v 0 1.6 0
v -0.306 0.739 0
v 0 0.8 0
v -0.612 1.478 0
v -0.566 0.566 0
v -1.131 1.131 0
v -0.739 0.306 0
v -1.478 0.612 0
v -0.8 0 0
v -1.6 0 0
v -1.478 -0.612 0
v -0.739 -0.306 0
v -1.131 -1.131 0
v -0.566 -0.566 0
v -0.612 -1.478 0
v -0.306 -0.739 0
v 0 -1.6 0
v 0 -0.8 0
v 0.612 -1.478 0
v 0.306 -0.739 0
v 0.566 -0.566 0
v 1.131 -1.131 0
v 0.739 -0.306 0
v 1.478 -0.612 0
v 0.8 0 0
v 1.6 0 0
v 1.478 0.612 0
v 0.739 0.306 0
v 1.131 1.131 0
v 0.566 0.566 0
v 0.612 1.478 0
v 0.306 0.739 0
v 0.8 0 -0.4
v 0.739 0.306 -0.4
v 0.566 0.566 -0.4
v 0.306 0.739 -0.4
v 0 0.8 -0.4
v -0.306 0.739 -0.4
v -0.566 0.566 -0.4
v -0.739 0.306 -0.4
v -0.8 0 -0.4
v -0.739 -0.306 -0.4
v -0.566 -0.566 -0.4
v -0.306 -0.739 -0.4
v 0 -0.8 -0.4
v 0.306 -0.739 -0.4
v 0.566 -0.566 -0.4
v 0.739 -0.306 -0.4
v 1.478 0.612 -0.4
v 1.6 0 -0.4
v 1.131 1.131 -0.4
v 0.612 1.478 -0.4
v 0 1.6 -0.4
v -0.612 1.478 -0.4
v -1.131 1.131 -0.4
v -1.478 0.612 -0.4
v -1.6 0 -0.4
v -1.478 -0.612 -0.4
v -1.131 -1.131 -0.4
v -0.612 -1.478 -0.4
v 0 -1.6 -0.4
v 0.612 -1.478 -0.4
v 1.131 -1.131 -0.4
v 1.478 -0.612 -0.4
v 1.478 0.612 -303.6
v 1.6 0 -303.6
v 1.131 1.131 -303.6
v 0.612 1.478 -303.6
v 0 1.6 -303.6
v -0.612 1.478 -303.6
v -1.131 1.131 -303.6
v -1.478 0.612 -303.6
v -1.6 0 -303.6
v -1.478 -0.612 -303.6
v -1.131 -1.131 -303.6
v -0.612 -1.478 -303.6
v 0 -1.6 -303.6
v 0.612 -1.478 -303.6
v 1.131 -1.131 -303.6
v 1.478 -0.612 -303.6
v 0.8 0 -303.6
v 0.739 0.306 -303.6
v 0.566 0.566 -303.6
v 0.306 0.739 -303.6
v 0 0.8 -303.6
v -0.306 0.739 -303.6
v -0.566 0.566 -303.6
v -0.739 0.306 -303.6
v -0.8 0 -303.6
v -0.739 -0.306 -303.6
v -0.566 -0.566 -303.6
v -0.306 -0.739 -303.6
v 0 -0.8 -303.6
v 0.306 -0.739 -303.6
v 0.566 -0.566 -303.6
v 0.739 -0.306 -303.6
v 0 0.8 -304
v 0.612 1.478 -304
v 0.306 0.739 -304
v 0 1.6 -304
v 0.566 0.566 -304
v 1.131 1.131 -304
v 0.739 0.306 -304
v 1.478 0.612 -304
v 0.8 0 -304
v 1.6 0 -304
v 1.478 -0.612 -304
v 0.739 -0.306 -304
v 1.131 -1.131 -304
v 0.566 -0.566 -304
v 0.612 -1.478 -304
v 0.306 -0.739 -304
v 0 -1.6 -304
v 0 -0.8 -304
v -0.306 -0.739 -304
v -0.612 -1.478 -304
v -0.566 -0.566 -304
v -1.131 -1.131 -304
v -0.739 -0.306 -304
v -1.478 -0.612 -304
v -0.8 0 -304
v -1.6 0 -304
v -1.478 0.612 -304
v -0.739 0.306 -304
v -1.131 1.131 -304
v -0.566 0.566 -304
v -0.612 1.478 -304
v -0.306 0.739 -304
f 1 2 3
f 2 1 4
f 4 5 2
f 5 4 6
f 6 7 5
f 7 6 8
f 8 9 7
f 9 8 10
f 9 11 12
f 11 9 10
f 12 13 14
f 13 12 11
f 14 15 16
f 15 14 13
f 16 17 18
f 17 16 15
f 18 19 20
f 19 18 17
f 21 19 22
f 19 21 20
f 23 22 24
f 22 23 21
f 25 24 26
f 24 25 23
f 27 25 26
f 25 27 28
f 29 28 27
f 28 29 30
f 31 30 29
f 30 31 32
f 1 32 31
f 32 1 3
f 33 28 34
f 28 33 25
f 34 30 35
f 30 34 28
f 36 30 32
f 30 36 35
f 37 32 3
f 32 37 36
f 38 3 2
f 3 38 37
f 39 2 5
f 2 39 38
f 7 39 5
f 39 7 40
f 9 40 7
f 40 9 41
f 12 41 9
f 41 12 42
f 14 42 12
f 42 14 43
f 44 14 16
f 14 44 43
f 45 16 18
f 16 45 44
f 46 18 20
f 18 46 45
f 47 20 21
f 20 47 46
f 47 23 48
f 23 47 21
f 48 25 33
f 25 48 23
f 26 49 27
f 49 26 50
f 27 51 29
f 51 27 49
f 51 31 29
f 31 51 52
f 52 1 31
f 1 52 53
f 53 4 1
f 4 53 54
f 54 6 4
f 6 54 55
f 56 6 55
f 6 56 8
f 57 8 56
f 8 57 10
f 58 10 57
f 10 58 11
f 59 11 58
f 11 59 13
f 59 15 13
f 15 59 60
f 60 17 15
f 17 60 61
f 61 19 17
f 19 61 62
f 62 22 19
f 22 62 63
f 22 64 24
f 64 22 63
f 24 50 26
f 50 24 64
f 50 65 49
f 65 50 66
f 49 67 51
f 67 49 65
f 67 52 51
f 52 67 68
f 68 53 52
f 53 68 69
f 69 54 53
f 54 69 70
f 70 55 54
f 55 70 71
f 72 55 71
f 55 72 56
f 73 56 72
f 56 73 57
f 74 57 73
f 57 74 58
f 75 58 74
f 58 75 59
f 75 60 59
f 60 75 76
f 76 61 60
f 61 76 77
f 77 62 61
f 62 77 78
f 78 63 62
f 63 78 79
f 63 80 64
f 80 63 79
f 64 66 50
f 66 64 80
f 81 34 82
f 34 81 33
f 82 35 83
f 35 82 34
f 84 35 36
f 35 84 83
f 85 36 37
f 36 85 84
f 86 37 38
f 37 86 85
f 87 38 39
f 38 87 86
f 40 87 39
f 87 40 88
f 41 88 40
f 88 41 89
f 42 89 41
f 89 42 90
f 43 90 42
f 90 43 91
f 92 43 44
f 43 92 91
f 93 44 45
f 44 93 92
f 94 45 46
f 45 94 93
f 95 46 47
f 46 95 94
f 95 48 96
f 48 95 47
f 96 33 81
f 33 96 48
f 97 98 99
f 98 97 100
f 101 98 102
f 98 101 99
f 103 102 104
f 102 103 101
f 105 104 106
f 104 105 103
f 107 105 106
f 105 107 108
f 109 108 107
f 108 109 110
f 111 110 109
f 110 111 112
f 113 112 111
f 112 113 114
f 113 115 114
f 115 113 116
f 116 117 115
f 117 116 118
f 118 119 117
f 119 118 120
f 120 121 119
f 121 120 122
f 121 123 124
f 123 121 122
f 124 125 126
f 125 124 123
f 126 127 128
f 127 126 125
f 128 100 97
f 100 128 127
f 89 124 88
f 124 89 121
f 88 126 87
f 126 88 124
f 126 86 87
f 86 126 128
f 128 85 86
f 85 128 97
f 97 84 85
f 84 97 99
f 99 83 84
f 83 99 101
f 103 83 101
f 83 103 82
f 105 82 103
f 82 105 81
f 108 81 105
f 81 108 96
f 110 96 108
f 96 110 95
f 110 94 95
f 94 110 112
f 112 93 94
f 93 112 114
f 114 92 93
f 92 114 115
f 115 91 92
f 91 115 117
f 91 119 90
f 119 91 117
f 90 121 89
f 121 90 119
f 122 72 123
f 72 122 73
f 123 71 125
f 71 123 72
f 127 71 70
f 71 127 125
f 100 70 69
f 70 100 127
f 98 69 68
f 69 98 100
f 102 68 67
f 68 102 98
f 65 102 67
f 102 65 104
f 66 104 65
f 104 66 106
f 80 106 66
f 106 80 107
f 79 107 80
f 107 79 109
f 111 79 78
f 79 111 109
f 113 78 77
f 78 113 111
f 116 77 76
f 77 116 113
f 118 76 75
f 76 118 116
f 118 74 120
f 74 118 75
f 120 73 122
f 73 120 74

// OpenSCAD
// file: ../p/4-4ring1.scad
use <../lib.scad>
function ldraw_lib__4_4ring1() = [
// 0 Ring  1 x 1.0
// 0 Name: 4-4ring1.dat
// 0 Author: James Jessiman
// 0 !LDRAW_ORG Primitive UPDATE 2009-01
// 0 !LICENSE Licensed under CC BY 4.0 : see CAreadme.txt
// 
// 0 BFC CERTIFY CCW
  [0,"BFC","CERTIFY"],
  [0,"BFC","CCW"],
// 
// 0 !HISTORY 1998-12-15 [PTadmin] Official Update 1998-10
// 0 !HISTORY 2002-04-08 [BrickCaster] Modified for BFC compliance
// 0 !HISTORY 2002-04-25 [PTadmin] Official Update 2002-02
// 0 !HISTORY 2007-06-24 [PTadmin] Header formatted for Contributor Agreement
// 0 !HISTORY 2008-07-01 [PTadmin] Official Update 2008-01
// 0 !HISTORY 2008-08-26 [cwdee] Switch polygon winding and rename
// 0 !HISTORY 2009-05-02 [PTadmin] Official Update 2009-01
// 
// 
// 4 16 -0.7654 0 1.8478 -0.3827 0 0.9239 0 0 1 0 0 2
  [4,16,-0.7654,0,1.8478,-0.3827,0,0.9239,0,0,1,0,0,2],
// 4 16 -1.4142 0 1.4142 -0.7071 0 0.7071 -0.3827 0 0.9239 -0.7654 0 1.8478
  [4,16,-1.4142,0,1.4142,-0.7071,0,0.7071,-0.3827,0,0.9239,-0.7654,0,1.8478],
// 4 16 -1.8478 0 0.7654 -0.9239 0 0.3827 -0.7071 0 0.7071 -1.4142 0 1.41420
  [4,16,-1.8478,0,0.7654,-0.9239,0,0.3827,-0.7071,0,0.7071,-1.4142,0,1.41420],
// 4 16 -2 0 0 -1 0 0 -0.9239 0 0.3827 -1.8478 0 0.7654
  [4,16,-2,0,0,-1,0,0,-0.9239,0,0.3827,-1.8478,0,0.7654],
// 4 16 -1.8478 0 -0.7654 -0.9239 0 -0.3827 -1 0 0 -2 0 0
  [4,16,-1.8478,0,-0.7654,-0.9239,0,-0.3827,-1,0,0,-2,0,0],
// 4 16 -1.4142 0 -1.4142 -0.7071 0 -0.7071 -0.9239 0 -0.3827 -1.8478 0 -0.7654
  [4,16,-1.4142,0,-1.4142,-0.7071,0,-0.7071,-0.9239,0,-0.3827,-1.8478,0,-0.7654],
// 4 16 -0.7654 0 -1.8478 -0.3827 0 -0.9239 -0.7071 0 -0.7071 -1.4142 0 -1.4142
  [4,16,-0.7654,0,-1.8478,-0.3827,0,-0.9239,-0.7071,0,-0.7071,-1.4142,0,-1.4142],
// 4 16 0 0 -2 0 0 -1 -0.3827 0 -0.9239 -0.7654 0 -1.8478
  [4,16,0,0,-2,0,0,-1,-0.3827,0,-0.9239,-0.7654,0,-1.8478],
// 4 16 0.7654 0 -1.8478 0.3827 0 -0.9239 0 0 -1 0 0 -2
  [4,16,0.7654,0,-1.8478,0.3827,0,-0.9239,0,0,-1,0,0,-2],
// 4 16 1.4142 0 -1.4142 0.7071 0 -0.7071 0.3827 0 -0.9239 0.7654 0 -1.8478
  [4,16,1.4142,0,-1.4142,0.7071,0,-0.7071,0.3827,0,-0.9239,0.7654,0,-1.8478],
// 4 16 1.8478 0 -0.7654 0.9239 0 -0.3827 0.7071 0 -0.7071 1.4142 0 -1.4142
  [4,16,1.8478,0,-0.7654,0.9239,0,-0.3827,0.7071,0,-0.7071,1.4142,0,-1.4142],
// 4 16 2 0 0 1 0 0 0.9239 0 -0.3827 1.8478 0 -0.7654
  [4,16,2,0,0,1,0,0,0.9239,0,-0.3827,1.8478,0,-0.7654],
// 4 16 1.8478 0 0.7654 0.9239 0 0.3827 1 0 0 2 0 0
  [4,16,1.8478,0,0.7654,0.9239,0,0.3827,1,0,0,2,0,0],
// 4 16 1.4142 0 1.4142 0.7071 0 0.7071 0.9239 0 0.3827 1.8478 0 0.7654
  [4,16,1.4142,0,1.4142,0.7071,0,0.7071,0.9239,0,0.3827,1.8478,0,0.7654],
// 4 16 0.7654 0 1.8478 0.3827 0 0.9239 0.7071 0 0.7071 1.4142 0 1.4142
  [4,16,0.7654,0,1.8478,0.3827,0,0.9239,0.7071,0,0.7071,1.4142,0,1.4142],
// 4 16 0 0 2 0 0 1 0.3827 0 0.9239 0.7654 0 1.8478
  [4,16,0,0,2,0,0,1,0.3827,0,0.9239,0.7654,0,1.8478],
// 0
];
module ldraw_lib__4_4ring1(step=0, col=false, unit=2/5, alt=false, line=0.2, solid=!$preview)
    makepoly(ldraw_lib__4_4ring1(), step=step, col=col, unit=unit, alt=alt, line=line, solid=solid);
ldraw_lib__4_4ring1(line=0.2);
// file: ../p/4-4edge.scad
use <../lib.scad>
function ldraw_lib__4_4edge() = [
// 0 Circle 1.0
// 0 Name: 4-4edge.dat
// 0 Author: James Jessiman
// 0 !LDRAW_ORG Primitive UPDATE 2017-01
// 0 !LICENSE Licensed under CC BY 4.0 : see CAreadme.txt
// 
// 0 BFC CERTIFY CCW
  [0,"BFC","CERTIFY"],
  [0,"BFC","CCW"],
// 
// 0 !HISTORY 1998-12-15 [PTadmin] Official Update 1998-10
// 0 !HISTORY 2005-12-28 [PTadmin] Official Update 2005-01
// 0 !HISTORY 2007-06-24 [PTadmin] Header formatted for Contributor Agreement
// 0 !HISTORY 2008-07-01 [PTadmin] Official Update 2008-01
// 0 !HISTORY 2017-01-15 [Steffen] BFCed
// 0 !HISTORY 2017-12-30 [PTadmin] Official Update 2017-01
// 
// 
// 2 24 1 0 0 0.9239 0 0.3827
  [2,24,1,0,0,0.9239,0,0.3827],
// 2 24 0.9239 0 0.3827 0.7071 0 0.7071
  [2,24,0.9239,0,0.3827,0.7071,0,0.7071],
// 2 24 0.7071 0 0.7071 0.3827 0 0.9239
  [2,24,0.7071,0,0.7071,0.3827,0,0.9239],
// 2 24 0.3827 0 0.9239 0 0 1
  [2,24,0.3827,0,0.9239,0,0,1],
// 2 24 0 0 1 -0.3827 0 0.9239
  [2,24,0,0,1,-0.3827,0,0.9239],
// 2 24 -0.3827 0 0.9239 -0.7071 0 0.7071
  [2,24,-0.3827,0,0.9239,-0.7071,0,0.7071],
// 2 24 -0.7071 0 0.7071 -0.9239 0 0.3827
  [2,24,-0.7071,0,0.7071,-0.9239,0,0.3827],
// 2 24 -0.9239 0 0.3827 -1 0 -0
  [2,24,-0.9239,0,0.3827,-1,0,-0],
// 2 24 -1 0 -0 -0.9239 0 -0.3827
  [2,24,-1,0,-0,-0.9239,0,-0.3827],
// 2 24 -0.9239 0 -0.3827 -0.7071 0 -0.7071
  [2,24,-0.9239,0,-0.3827,-0.7071,0,-0.7071],
// 2 24 -0.7071 0 -0.7071 -0.3827 0 -0.9239
  [2,24,-0.7071,0,-0.7071,-0.3827,0,-0.9239],
// 2 24 -0.3827 0 -0.9239 0 0 -1
  [2,24,-0.3827,0,-0.9239,0,0,-1],
// 2 24 0 0 -1 0.3827 0 -0.9239
  [2,24,0,0,-1,0.3827,0,-0.9239],
// 2 24 0.3827 0 -0.9239 0.7071 0 -0.7071
  [2,24,0.3827,0,-0.9239,0.7071,0,-0.7071],
// 2 24 0.7071 0 -0.7071 0.9239 0 -0.3827
  [2,24,0.7071,0,-0.7071,0.9239,0,-0.3827],
// 2 24 0.9239 0 -0.3827 1 0 0
  [2,24,0.9239,0,-0.3827,1,0,0],
];
module ldraw_lib__4_4edge(step=0, col=false, unit=2/5, alt=false, line=0.2, solid=!$preview)
    makepoly(ldraw_lib__4_4edge(), step=step, col=col, unit=unit, alt=alt, line=line, solid=solid);
ldraw_lib__4_4edge(line=0.2);
// file: ../p/4-4cyli.scad
use <../lib.scad>
function ldraw_lib__4_4cyli() = [
// 0 Cylinder 1.0
// 0 Name: 4-4cyli.dat
// 0 Author: James Jessiman
// 0 !LDRAW_ORG Primitive UPDATE 2005-01
// 0 !LICENSE Licensed under CC BY 4.0 : see CAreadme.txt
// 
// 0 BFC CERTIFY CCW
  [0,"BFC","CERTIFY"],
  [0,"BFC","CCW"],
// 
// 0 !HISTORY 1998-12-15 [PTadmin] Official Update 1998-10
// 0 !HISTORY 2002-03-23 [sbliss] Added BFC statement; merged headers from files in distributions LDraw 0.27 and Complete.
// 0 !HISTORY 2002-04-25 [PTadmin] Official Update 2002-02
// 0 !HISTORY 2004-12-14 [guyvivan] BFC CCW
// 0 !HISTORY 2005-12-28 [PTadmin] Official Update 2005-01
// 0 !HISTORY 2007-06-24 [PTadmin] Header formatted for Contributor Agreement
// 0 !HISTORY 2008-07-01 [PTadmin] Official Update 2008-01
// 
// 
// 4 16 1 1 0 0.9239 1 0.3827 0.9239 0 0.3827 1 0 0
  [4,16,1,1,0,0.9239,1,0.3827,0.9239,0,0.3827,1,0,0],
// 5 24 1 0 0 1 1 0 0.9239 0 0.3827 0.9239 0 -0.3827
  [5,24,1,0,0,1,1,0,0.9239,0,0.3827,0.9239,0,-0.3827],
// 4 16 0.9239 1 0.3827 0.7071 1 0.7071 0.7071 0 0.7071 0.9239 0 0.3827
  [4,16,0.9239,1,0.3827,0.7071,1,0.7071,0.7071,0,0.7071,0.9239,0,0.3827],
// 5 24 0.9239 0 0.3827 0.9239 1 0.3827 0.7071 0 0.7071 1 0 0
  [5,24,0.9239,0,0.3827,0.9239,1,0.3827,0.7071,0,0.7071,1,0,0],
// 4 16 0.7071 1 0.7071 0.3827 1 0.9239 0.3827 0 0.9239 0.7071 0 0.7071
  [4,16,0.7071,1,0.7071,0.3827,1,0.9239,0.3827,0,0.9239,0.7071,0,0.7071],
// 5 24 0.7071 0 0.7071 0.7071 1 0.7071 0.3827 0 0.9239 0.9239 0 0.3827
  [5,24,0.7071,0,0.7071,0.7071,1,0.7071,0.3827,0,0.9239,0.9239,0,0.3827],
// 4 16 0.3827 1 0.9239 0 1 1 0 0 1 0.3827 0 0.9239
  [4,16,0.3827,1,0.9239,0,1,1,0,0,1,0.3827,0,0.9239],
// 5 24 0.3827 0 0.9239 0.3827 1 0.9239 0 0 1 0.7071 0 0.7071
  [5,24,0.3827,0,0.9239,0.3827,1,0.9239,0,0,1,0.7071,0,0.7071],
// 4 16 0 1 1 -0.3827 1 0.9239 -0.3827 0 0.9239 0 0 1
  [4,16,0,1,1,-0.3827,1,0.9239,-0.3827,0,0.9239,0,0,1],
// 5 24 0 0 1 0 1 1 -0.3827 0 0.9239 0.3827 0 0.9239
  [5,24,0,0,1,0,1,1,-0.3827,0,0.9239,0.3827,0,0.9239],
// 4 16 -0.3827 1 0.9239 -0.7071 1 0.7071 -0.7071 0 0.7071 -0.3827 0 0.9239
  [4,16,-0.3827,1,0.9239,-0.7071,1,0.7071,-0.7071,0,0.7071,-0.3827,0,0.9239],
// 5 24 -0.3827 0 0.9239 -0.3827 1 0.9239 -0.7071 0 0.7071 0 0 1
  [5,24,-0.3827,0,0.9239,-0.3827,1,0.9239,-0.7071,0,0.7071,0,0,1],
// 4 16 -0.7071 1 0.7071 -0.9239 1 0.3827 -0.9239 0 0.3827 -0.7071 0 0.7071
  [4,16,-0.7071,1,0.7071,-0.9239,1,0.3827,-0.9239,0,0.3827,-0.7071,0,0.7071],
// 5 24 -0.7071 0 0.7071 -0.7071 1 0.7071 -0.9239 0 0.3827 -0.3827 0 0.9239
  [5,24,-0.7071,0,0.7071,-0.7071,1,0.7071,-0.9239,0,0.3827,-0.3827,0,0.9239],
// 4 16 -0.9239 1 0.3827 -1 1 0 -1 0 0 -0.9239 0 0.3827
  [4,16,-0.9239,1,0.3827,-1,1,0,-1,0,0,-0.9239,0,0.3827],
// 5 24 -0.9239 0 0.3827 -0.9239 1 0.3827 -1 0 0 -0.7071 0 0.7071
  [5,24,-0.9239,0,0.3827,-0.9239,1,0.3827,-1,0,0,-0.7071,0,0.7071],
// 4 16 -1 1 0 -0.9239 1 -0.3827 -0.9239 0 -0.3827 -1 0 0
  [4,16,-1,1,0,-0.9239,1,-0.3827,-0.9239,0,-0.3827,-1,0,0],
// 5 24 -1 0 0 -1 1 0 -0.9239 0 -0.3827 -0.9239 0 0.3827
  [5,24,-1,0,0,-1,1,0,-0.9239,0,-0.3827,-0.9239,0,0.3827],
// 4 16 -0.9239 1 -0.3827 -0.7071 1 -0.7071 -0.7071 0 -0.7071 -0.9239 0 -0.3827
  [4,16,-0.9239,1,-0.3827,-0.7071,1,-0.7071,-0.7071,0,-0.7071,-0.9239,0,-0.3827],
// 5 24 -0.9239 0 -0.3827 -0.9239 1 -0.3827 -0.7071 0 -0.7071 -1 0 0
  [5,24,-0.9239,0,-0.3827,-0.9239,1,-0.3827,-0.7071,0,-0.7071,-1,0,0],
// 4 16 -0.7071 1 -0.7071 -0.3827 1 -0.9239 -0.3827 0 -0.9239 -0.7071 0 -0.7071
  [4,16,-0.7071,1,-0.7071,-0.3827,1,-0.9239,-0.3827,0,-0.9239,-0.7071,0,-0.7071],
// 5 24 -0.7071 0 -0.7071 -0.7071 1 -0.7071 -0.3827 0 -0.9239 -0.9239 0 -0.3827
  [5,24,-0.7071,0,-0.7071,-0.7071,1,-0.7071,-0.3827,0,-0.9239,-0.9239,0,-0.3827],
// 4 16 -0.3827 1 -0.9239 0 1 -1 0 0 -1 -0.3827 0 -0.9239
  [4,16,-0.3827,1,-0.9239,0,1,-1,0,0,-1,-0.3827,0,-0.9239],
// 5 24 -0.3827 0 -0.9239 -0.3827 1 -0.9239 0 0 -1 -0.7071 0 -0.7071
  [5,24,-0.3827,0,-0.9239,-0.3827,1,-0.9239,0,0,-1,-0.7071,0,-0.7071],
// 4 16 0 1 -1 0.3827 1 -0.9239 0.3827 0 -0.9239 0 0 -1
  [4,16,0,1,-1,0.3827,1,-0.9239,0.3827,0,-0.9239,0,0,-1],
// 5 24 0 0 -1 0 1 -1 0.3827 0 -0.9239 -0.3827 0 -0.9239
  [5,24,0,0,-1,0,1,-1,0.3827,0,-0.9239,-0.3827,0,-0.9239],
// 4 16 0.3827 1 -0.9239 0.7071 1 -0.7071 0.7071 0 -0.7071 0.3827 0 -0.9239
  [4,16,0.3827,1,-0.9239,0.7071,1,-0.7071,0.7071,0,-0.7071,0.3827,0,-0.9239],
// 5 24 0.3827 0 -0.9239 0.3827 1 -0.9239 0.7071 0 -0.7071 0 0 -1
  [5,24,0.3827,0,-0.9239,0.3827,1,-0.9239,0.7071,0,-0.7071,0,0,-1],
// 4 16 0.7071 1 -0.7071 0.9239 1 -0.3827 0.9239 0 -0.3827 0.7071 0 -0.7071
  [4,16,0.7071,1,-0.7071,0.9239,1,-0.3827,0.9239,0,-0.3827,0.7071,0,-0.7071],
// 5 24 0.7071 0 -0.7071 0.7071 1 -0.7071 0.9239 0 -0.3827 0.3827 0 -0.9239
  [5,24,0.7071,0,-0.7071,0.7071,1,-0.7071,0.9239,0,-0.3827,0.3827,0,-0.9239],
// 4 16 0.9239 1 -0.3827 1 1 0 1 0 0 0.9239 0 -0.3827
  [4,16,0.9239,1,-0.3827,1,1,0,1,0,0,0.9239,0,-0.3827],
// 5 24 0.9239 0 -0.3827 0.9239 1 -0.3827 1 0 0 0.7071 0 -0.7071
  [5,24,0.9239,0,-0.3827,0.9239,1,-0.3827,1,0,0,0.7071,0,-0.7071],
// 0
];
module ldraw_lib__4_4cyli(step=0, col=false, unit=2/5, alt=false, line=0.2, solid=!$preview)
    makepoly(ldraw_lib__4_4cyli(), step=step, col=col, unit=unit, alt=alt, line=line, solid=solid);
ldraw_lib__4_4cyli(line=0.2);
// file: u9053.scad
use <../lib.scad>
use <../p/4-4cyli.scad>
use <../p/4-4edge.scad>
use <../p/4-4ring1.scad>
function ldraw_lib__u9053() = [
// 0 ~Technic Flex-System Hose End
// 0 Name: u9053.dat
// 0 Author: William Howard [WilliamH]
// 0 !LDRAW_ORG Part UPDATE 2011-02
// 0 !LICENSE Licensed under CC BY 2.0 and CC BY 4.0 : see CAreadme.txt
// 
// 0 BFC CERTIFY CCW
  [0,"BFC","CERTIFY"],
  [0,"BFC","CCW"],
// 
// 0 !HISTORY 2011-12-21 [cwdee] Reworked subparting technique
// 0 !HISTORY 2011-12-23 [PTadmin] Renamed from 76
// 0 !HISTORY 2011-12-29 [PTadmin] Official Update 2011-02
// 
// 
// 1 16 0 0 0 2 0 0 0 1 0 0 0 2 4-4ring1.dat
  [1,16,0,0,0,2,0,0,0,1,0,0,0,2, ldraw_lib__4_4ring1()],
// 1 16 0 0 0 2 0 0 0 1 0 0 0 2 4-4edge.dat
  [1,16,0,0,0,2,0,0,0,1,0,0,0,2, ldraw_lib__4_4edge()],
// 0 BFC INVERTNEXT
  [0,"BFC","INVERTNEXT"],
// 1 16 0 0 0 2 0 0 0 1 0 0 0 2 4-4cyli.dat
  [1,16,0,0,0,2,0,0,0,1,0,0,0,2, ldraw_lib__4_4cyli()],
// 1 16 0 0 0 4 0 0 0 1 0 0 0 4 4-4edge.dat
  [1,16,0,0,0,4,0,0,0,1,0,0,0,4, ldraw_lib__4_4edge()],
// 1 16 0 0 0 4 0 0 0 1 0 0 0 4 4-4cyli.dat
  [1,16,0,0,0,4,0,0,0,1,0,0,0,4, ldraw_lib__4_4cyli()],
// 0
];
module ldraw_lib__u9053(step=0, col=false, unit=2/5, alt=false, line=0.2, solid=!$preview)
    makepoly(ldraw_lib__u9053(), step=step, col=col, unit=unit, alt=alt, line=line, solid=solid);
ldraw_lib__u9053(line=0.2);
// file: 77.scad
use <../lib.scad>
use <../p/4-4cyli.scad>
function ldraw_lib__77() = [
// 0 ~Technic Flex-System Hose Segment
// 0 Name: 77.dat
// 0 Author: William Howard [WilliamH]
// 0 !LDRAW_ORG Part UPDATE 2011-02
// 0 !LICENSE Licensed under CC BY 2.0 and CC BY 4.0 : see CAreadme.txt
// 
// 0 BFC CERTIFY CCW
  [0,"BFC","CERTIFY"],
  [0,"BFC","CCW"],
// 
// 0 !HISTORY 2011-12-21 [cwdee] Reworked subparting technique
// 0 !HISTORY 2011-12-29 [PTadmin] Official Update 2011-02
// 
// 
// 1 16 0 0 0 4 0 0 0 1 0 0 0 4 4-4cyli.dat
  [1,16,0,0,0,4,0,0,0,1,0,0,0,4, ldraw_lib__4_4cyli()],
// 0 BFC INVERTNEXT
  [0,"BFC","INVERTNEXT"],
// 1 16 0 0 0 2 0 0 0 1 0 0 0 2 4-4cyli.dat
  [1,16,0,0,0,2,0,0,0,1,0,0,0,2, ldraw_lib__4_4cyli()],
// 0
];
module ldraw_lib__77(step=0, col=false, unit=2/5, alt=false, line=0.2, solid=!$preview)
    makepoly(ldraw_lib__77(), step=step, col=col, unit=unit, alt=alt, line=line, solid=solid);
ldraw_lib__77(line=0.2);
// main file
use <../lib.scad>
use <77.scad>
use <u9053.scad>
function ldraw_lib__60778() = [
// 0 Technic Flex-System Hose 38L (760LDU)
// 0 Name: 60778.dat
// 0 Author: Manfred Schaefer [Lego-Manfred]
// 0 !LDRAW_ORG Part UPDATE 2025-03
// 0 !LICENSE Licensed under CC BY 4.0 : see CAreadme.txt
// 
// 0 BFC CERTIFY CCW
  [0,"BFC","CERTIFY"],
  [0,"BFC","CCW"],
// 
// 0 !KEYWORDS bar, BrickLink 75c38, Rebrickable 75c38, set 42083, tube
// 
// 0 !HISTORY 2022-02-06 [Lego-Manfred] Modifikation of 22461.dat, length changed
// 0 !HISTORY 2025-03-30 [OrionP] Official Update 2025-03
// 
// 
// 1 16 0 0 0 1 0 0 0 1 0 0 0 1 u9053.dat
  [1,16,0,0,0,1,0,0,0,1,0,0,0,1, ldraw_lib__u9053()],
// 1 16 0 1 0 1 0 0 0 758 0 0 0 1 77.dat
  [1,16,0,1,0,1,0,0,0,758,0,0,0,1, ldraw_lib__77()],
// 1 16 0 760 0 -1 0 0 0 -1 0 0 0 1 u9053.dat
  [1,16,0,760,0,-1,0,0,0,-1,0,0,0,1, ldraw_lib__u9053()],
];
module ldraw_lib__60778(step=0, col=false, unit=2/5, alt=false, line=0.2, solid=!$preview)
    makepoly(ldraw_lib__60778(), step=step, col=col, unit=unit, alt=alt, line=line, solid=solid);
ldraw_lib__60778(line=0.2);
